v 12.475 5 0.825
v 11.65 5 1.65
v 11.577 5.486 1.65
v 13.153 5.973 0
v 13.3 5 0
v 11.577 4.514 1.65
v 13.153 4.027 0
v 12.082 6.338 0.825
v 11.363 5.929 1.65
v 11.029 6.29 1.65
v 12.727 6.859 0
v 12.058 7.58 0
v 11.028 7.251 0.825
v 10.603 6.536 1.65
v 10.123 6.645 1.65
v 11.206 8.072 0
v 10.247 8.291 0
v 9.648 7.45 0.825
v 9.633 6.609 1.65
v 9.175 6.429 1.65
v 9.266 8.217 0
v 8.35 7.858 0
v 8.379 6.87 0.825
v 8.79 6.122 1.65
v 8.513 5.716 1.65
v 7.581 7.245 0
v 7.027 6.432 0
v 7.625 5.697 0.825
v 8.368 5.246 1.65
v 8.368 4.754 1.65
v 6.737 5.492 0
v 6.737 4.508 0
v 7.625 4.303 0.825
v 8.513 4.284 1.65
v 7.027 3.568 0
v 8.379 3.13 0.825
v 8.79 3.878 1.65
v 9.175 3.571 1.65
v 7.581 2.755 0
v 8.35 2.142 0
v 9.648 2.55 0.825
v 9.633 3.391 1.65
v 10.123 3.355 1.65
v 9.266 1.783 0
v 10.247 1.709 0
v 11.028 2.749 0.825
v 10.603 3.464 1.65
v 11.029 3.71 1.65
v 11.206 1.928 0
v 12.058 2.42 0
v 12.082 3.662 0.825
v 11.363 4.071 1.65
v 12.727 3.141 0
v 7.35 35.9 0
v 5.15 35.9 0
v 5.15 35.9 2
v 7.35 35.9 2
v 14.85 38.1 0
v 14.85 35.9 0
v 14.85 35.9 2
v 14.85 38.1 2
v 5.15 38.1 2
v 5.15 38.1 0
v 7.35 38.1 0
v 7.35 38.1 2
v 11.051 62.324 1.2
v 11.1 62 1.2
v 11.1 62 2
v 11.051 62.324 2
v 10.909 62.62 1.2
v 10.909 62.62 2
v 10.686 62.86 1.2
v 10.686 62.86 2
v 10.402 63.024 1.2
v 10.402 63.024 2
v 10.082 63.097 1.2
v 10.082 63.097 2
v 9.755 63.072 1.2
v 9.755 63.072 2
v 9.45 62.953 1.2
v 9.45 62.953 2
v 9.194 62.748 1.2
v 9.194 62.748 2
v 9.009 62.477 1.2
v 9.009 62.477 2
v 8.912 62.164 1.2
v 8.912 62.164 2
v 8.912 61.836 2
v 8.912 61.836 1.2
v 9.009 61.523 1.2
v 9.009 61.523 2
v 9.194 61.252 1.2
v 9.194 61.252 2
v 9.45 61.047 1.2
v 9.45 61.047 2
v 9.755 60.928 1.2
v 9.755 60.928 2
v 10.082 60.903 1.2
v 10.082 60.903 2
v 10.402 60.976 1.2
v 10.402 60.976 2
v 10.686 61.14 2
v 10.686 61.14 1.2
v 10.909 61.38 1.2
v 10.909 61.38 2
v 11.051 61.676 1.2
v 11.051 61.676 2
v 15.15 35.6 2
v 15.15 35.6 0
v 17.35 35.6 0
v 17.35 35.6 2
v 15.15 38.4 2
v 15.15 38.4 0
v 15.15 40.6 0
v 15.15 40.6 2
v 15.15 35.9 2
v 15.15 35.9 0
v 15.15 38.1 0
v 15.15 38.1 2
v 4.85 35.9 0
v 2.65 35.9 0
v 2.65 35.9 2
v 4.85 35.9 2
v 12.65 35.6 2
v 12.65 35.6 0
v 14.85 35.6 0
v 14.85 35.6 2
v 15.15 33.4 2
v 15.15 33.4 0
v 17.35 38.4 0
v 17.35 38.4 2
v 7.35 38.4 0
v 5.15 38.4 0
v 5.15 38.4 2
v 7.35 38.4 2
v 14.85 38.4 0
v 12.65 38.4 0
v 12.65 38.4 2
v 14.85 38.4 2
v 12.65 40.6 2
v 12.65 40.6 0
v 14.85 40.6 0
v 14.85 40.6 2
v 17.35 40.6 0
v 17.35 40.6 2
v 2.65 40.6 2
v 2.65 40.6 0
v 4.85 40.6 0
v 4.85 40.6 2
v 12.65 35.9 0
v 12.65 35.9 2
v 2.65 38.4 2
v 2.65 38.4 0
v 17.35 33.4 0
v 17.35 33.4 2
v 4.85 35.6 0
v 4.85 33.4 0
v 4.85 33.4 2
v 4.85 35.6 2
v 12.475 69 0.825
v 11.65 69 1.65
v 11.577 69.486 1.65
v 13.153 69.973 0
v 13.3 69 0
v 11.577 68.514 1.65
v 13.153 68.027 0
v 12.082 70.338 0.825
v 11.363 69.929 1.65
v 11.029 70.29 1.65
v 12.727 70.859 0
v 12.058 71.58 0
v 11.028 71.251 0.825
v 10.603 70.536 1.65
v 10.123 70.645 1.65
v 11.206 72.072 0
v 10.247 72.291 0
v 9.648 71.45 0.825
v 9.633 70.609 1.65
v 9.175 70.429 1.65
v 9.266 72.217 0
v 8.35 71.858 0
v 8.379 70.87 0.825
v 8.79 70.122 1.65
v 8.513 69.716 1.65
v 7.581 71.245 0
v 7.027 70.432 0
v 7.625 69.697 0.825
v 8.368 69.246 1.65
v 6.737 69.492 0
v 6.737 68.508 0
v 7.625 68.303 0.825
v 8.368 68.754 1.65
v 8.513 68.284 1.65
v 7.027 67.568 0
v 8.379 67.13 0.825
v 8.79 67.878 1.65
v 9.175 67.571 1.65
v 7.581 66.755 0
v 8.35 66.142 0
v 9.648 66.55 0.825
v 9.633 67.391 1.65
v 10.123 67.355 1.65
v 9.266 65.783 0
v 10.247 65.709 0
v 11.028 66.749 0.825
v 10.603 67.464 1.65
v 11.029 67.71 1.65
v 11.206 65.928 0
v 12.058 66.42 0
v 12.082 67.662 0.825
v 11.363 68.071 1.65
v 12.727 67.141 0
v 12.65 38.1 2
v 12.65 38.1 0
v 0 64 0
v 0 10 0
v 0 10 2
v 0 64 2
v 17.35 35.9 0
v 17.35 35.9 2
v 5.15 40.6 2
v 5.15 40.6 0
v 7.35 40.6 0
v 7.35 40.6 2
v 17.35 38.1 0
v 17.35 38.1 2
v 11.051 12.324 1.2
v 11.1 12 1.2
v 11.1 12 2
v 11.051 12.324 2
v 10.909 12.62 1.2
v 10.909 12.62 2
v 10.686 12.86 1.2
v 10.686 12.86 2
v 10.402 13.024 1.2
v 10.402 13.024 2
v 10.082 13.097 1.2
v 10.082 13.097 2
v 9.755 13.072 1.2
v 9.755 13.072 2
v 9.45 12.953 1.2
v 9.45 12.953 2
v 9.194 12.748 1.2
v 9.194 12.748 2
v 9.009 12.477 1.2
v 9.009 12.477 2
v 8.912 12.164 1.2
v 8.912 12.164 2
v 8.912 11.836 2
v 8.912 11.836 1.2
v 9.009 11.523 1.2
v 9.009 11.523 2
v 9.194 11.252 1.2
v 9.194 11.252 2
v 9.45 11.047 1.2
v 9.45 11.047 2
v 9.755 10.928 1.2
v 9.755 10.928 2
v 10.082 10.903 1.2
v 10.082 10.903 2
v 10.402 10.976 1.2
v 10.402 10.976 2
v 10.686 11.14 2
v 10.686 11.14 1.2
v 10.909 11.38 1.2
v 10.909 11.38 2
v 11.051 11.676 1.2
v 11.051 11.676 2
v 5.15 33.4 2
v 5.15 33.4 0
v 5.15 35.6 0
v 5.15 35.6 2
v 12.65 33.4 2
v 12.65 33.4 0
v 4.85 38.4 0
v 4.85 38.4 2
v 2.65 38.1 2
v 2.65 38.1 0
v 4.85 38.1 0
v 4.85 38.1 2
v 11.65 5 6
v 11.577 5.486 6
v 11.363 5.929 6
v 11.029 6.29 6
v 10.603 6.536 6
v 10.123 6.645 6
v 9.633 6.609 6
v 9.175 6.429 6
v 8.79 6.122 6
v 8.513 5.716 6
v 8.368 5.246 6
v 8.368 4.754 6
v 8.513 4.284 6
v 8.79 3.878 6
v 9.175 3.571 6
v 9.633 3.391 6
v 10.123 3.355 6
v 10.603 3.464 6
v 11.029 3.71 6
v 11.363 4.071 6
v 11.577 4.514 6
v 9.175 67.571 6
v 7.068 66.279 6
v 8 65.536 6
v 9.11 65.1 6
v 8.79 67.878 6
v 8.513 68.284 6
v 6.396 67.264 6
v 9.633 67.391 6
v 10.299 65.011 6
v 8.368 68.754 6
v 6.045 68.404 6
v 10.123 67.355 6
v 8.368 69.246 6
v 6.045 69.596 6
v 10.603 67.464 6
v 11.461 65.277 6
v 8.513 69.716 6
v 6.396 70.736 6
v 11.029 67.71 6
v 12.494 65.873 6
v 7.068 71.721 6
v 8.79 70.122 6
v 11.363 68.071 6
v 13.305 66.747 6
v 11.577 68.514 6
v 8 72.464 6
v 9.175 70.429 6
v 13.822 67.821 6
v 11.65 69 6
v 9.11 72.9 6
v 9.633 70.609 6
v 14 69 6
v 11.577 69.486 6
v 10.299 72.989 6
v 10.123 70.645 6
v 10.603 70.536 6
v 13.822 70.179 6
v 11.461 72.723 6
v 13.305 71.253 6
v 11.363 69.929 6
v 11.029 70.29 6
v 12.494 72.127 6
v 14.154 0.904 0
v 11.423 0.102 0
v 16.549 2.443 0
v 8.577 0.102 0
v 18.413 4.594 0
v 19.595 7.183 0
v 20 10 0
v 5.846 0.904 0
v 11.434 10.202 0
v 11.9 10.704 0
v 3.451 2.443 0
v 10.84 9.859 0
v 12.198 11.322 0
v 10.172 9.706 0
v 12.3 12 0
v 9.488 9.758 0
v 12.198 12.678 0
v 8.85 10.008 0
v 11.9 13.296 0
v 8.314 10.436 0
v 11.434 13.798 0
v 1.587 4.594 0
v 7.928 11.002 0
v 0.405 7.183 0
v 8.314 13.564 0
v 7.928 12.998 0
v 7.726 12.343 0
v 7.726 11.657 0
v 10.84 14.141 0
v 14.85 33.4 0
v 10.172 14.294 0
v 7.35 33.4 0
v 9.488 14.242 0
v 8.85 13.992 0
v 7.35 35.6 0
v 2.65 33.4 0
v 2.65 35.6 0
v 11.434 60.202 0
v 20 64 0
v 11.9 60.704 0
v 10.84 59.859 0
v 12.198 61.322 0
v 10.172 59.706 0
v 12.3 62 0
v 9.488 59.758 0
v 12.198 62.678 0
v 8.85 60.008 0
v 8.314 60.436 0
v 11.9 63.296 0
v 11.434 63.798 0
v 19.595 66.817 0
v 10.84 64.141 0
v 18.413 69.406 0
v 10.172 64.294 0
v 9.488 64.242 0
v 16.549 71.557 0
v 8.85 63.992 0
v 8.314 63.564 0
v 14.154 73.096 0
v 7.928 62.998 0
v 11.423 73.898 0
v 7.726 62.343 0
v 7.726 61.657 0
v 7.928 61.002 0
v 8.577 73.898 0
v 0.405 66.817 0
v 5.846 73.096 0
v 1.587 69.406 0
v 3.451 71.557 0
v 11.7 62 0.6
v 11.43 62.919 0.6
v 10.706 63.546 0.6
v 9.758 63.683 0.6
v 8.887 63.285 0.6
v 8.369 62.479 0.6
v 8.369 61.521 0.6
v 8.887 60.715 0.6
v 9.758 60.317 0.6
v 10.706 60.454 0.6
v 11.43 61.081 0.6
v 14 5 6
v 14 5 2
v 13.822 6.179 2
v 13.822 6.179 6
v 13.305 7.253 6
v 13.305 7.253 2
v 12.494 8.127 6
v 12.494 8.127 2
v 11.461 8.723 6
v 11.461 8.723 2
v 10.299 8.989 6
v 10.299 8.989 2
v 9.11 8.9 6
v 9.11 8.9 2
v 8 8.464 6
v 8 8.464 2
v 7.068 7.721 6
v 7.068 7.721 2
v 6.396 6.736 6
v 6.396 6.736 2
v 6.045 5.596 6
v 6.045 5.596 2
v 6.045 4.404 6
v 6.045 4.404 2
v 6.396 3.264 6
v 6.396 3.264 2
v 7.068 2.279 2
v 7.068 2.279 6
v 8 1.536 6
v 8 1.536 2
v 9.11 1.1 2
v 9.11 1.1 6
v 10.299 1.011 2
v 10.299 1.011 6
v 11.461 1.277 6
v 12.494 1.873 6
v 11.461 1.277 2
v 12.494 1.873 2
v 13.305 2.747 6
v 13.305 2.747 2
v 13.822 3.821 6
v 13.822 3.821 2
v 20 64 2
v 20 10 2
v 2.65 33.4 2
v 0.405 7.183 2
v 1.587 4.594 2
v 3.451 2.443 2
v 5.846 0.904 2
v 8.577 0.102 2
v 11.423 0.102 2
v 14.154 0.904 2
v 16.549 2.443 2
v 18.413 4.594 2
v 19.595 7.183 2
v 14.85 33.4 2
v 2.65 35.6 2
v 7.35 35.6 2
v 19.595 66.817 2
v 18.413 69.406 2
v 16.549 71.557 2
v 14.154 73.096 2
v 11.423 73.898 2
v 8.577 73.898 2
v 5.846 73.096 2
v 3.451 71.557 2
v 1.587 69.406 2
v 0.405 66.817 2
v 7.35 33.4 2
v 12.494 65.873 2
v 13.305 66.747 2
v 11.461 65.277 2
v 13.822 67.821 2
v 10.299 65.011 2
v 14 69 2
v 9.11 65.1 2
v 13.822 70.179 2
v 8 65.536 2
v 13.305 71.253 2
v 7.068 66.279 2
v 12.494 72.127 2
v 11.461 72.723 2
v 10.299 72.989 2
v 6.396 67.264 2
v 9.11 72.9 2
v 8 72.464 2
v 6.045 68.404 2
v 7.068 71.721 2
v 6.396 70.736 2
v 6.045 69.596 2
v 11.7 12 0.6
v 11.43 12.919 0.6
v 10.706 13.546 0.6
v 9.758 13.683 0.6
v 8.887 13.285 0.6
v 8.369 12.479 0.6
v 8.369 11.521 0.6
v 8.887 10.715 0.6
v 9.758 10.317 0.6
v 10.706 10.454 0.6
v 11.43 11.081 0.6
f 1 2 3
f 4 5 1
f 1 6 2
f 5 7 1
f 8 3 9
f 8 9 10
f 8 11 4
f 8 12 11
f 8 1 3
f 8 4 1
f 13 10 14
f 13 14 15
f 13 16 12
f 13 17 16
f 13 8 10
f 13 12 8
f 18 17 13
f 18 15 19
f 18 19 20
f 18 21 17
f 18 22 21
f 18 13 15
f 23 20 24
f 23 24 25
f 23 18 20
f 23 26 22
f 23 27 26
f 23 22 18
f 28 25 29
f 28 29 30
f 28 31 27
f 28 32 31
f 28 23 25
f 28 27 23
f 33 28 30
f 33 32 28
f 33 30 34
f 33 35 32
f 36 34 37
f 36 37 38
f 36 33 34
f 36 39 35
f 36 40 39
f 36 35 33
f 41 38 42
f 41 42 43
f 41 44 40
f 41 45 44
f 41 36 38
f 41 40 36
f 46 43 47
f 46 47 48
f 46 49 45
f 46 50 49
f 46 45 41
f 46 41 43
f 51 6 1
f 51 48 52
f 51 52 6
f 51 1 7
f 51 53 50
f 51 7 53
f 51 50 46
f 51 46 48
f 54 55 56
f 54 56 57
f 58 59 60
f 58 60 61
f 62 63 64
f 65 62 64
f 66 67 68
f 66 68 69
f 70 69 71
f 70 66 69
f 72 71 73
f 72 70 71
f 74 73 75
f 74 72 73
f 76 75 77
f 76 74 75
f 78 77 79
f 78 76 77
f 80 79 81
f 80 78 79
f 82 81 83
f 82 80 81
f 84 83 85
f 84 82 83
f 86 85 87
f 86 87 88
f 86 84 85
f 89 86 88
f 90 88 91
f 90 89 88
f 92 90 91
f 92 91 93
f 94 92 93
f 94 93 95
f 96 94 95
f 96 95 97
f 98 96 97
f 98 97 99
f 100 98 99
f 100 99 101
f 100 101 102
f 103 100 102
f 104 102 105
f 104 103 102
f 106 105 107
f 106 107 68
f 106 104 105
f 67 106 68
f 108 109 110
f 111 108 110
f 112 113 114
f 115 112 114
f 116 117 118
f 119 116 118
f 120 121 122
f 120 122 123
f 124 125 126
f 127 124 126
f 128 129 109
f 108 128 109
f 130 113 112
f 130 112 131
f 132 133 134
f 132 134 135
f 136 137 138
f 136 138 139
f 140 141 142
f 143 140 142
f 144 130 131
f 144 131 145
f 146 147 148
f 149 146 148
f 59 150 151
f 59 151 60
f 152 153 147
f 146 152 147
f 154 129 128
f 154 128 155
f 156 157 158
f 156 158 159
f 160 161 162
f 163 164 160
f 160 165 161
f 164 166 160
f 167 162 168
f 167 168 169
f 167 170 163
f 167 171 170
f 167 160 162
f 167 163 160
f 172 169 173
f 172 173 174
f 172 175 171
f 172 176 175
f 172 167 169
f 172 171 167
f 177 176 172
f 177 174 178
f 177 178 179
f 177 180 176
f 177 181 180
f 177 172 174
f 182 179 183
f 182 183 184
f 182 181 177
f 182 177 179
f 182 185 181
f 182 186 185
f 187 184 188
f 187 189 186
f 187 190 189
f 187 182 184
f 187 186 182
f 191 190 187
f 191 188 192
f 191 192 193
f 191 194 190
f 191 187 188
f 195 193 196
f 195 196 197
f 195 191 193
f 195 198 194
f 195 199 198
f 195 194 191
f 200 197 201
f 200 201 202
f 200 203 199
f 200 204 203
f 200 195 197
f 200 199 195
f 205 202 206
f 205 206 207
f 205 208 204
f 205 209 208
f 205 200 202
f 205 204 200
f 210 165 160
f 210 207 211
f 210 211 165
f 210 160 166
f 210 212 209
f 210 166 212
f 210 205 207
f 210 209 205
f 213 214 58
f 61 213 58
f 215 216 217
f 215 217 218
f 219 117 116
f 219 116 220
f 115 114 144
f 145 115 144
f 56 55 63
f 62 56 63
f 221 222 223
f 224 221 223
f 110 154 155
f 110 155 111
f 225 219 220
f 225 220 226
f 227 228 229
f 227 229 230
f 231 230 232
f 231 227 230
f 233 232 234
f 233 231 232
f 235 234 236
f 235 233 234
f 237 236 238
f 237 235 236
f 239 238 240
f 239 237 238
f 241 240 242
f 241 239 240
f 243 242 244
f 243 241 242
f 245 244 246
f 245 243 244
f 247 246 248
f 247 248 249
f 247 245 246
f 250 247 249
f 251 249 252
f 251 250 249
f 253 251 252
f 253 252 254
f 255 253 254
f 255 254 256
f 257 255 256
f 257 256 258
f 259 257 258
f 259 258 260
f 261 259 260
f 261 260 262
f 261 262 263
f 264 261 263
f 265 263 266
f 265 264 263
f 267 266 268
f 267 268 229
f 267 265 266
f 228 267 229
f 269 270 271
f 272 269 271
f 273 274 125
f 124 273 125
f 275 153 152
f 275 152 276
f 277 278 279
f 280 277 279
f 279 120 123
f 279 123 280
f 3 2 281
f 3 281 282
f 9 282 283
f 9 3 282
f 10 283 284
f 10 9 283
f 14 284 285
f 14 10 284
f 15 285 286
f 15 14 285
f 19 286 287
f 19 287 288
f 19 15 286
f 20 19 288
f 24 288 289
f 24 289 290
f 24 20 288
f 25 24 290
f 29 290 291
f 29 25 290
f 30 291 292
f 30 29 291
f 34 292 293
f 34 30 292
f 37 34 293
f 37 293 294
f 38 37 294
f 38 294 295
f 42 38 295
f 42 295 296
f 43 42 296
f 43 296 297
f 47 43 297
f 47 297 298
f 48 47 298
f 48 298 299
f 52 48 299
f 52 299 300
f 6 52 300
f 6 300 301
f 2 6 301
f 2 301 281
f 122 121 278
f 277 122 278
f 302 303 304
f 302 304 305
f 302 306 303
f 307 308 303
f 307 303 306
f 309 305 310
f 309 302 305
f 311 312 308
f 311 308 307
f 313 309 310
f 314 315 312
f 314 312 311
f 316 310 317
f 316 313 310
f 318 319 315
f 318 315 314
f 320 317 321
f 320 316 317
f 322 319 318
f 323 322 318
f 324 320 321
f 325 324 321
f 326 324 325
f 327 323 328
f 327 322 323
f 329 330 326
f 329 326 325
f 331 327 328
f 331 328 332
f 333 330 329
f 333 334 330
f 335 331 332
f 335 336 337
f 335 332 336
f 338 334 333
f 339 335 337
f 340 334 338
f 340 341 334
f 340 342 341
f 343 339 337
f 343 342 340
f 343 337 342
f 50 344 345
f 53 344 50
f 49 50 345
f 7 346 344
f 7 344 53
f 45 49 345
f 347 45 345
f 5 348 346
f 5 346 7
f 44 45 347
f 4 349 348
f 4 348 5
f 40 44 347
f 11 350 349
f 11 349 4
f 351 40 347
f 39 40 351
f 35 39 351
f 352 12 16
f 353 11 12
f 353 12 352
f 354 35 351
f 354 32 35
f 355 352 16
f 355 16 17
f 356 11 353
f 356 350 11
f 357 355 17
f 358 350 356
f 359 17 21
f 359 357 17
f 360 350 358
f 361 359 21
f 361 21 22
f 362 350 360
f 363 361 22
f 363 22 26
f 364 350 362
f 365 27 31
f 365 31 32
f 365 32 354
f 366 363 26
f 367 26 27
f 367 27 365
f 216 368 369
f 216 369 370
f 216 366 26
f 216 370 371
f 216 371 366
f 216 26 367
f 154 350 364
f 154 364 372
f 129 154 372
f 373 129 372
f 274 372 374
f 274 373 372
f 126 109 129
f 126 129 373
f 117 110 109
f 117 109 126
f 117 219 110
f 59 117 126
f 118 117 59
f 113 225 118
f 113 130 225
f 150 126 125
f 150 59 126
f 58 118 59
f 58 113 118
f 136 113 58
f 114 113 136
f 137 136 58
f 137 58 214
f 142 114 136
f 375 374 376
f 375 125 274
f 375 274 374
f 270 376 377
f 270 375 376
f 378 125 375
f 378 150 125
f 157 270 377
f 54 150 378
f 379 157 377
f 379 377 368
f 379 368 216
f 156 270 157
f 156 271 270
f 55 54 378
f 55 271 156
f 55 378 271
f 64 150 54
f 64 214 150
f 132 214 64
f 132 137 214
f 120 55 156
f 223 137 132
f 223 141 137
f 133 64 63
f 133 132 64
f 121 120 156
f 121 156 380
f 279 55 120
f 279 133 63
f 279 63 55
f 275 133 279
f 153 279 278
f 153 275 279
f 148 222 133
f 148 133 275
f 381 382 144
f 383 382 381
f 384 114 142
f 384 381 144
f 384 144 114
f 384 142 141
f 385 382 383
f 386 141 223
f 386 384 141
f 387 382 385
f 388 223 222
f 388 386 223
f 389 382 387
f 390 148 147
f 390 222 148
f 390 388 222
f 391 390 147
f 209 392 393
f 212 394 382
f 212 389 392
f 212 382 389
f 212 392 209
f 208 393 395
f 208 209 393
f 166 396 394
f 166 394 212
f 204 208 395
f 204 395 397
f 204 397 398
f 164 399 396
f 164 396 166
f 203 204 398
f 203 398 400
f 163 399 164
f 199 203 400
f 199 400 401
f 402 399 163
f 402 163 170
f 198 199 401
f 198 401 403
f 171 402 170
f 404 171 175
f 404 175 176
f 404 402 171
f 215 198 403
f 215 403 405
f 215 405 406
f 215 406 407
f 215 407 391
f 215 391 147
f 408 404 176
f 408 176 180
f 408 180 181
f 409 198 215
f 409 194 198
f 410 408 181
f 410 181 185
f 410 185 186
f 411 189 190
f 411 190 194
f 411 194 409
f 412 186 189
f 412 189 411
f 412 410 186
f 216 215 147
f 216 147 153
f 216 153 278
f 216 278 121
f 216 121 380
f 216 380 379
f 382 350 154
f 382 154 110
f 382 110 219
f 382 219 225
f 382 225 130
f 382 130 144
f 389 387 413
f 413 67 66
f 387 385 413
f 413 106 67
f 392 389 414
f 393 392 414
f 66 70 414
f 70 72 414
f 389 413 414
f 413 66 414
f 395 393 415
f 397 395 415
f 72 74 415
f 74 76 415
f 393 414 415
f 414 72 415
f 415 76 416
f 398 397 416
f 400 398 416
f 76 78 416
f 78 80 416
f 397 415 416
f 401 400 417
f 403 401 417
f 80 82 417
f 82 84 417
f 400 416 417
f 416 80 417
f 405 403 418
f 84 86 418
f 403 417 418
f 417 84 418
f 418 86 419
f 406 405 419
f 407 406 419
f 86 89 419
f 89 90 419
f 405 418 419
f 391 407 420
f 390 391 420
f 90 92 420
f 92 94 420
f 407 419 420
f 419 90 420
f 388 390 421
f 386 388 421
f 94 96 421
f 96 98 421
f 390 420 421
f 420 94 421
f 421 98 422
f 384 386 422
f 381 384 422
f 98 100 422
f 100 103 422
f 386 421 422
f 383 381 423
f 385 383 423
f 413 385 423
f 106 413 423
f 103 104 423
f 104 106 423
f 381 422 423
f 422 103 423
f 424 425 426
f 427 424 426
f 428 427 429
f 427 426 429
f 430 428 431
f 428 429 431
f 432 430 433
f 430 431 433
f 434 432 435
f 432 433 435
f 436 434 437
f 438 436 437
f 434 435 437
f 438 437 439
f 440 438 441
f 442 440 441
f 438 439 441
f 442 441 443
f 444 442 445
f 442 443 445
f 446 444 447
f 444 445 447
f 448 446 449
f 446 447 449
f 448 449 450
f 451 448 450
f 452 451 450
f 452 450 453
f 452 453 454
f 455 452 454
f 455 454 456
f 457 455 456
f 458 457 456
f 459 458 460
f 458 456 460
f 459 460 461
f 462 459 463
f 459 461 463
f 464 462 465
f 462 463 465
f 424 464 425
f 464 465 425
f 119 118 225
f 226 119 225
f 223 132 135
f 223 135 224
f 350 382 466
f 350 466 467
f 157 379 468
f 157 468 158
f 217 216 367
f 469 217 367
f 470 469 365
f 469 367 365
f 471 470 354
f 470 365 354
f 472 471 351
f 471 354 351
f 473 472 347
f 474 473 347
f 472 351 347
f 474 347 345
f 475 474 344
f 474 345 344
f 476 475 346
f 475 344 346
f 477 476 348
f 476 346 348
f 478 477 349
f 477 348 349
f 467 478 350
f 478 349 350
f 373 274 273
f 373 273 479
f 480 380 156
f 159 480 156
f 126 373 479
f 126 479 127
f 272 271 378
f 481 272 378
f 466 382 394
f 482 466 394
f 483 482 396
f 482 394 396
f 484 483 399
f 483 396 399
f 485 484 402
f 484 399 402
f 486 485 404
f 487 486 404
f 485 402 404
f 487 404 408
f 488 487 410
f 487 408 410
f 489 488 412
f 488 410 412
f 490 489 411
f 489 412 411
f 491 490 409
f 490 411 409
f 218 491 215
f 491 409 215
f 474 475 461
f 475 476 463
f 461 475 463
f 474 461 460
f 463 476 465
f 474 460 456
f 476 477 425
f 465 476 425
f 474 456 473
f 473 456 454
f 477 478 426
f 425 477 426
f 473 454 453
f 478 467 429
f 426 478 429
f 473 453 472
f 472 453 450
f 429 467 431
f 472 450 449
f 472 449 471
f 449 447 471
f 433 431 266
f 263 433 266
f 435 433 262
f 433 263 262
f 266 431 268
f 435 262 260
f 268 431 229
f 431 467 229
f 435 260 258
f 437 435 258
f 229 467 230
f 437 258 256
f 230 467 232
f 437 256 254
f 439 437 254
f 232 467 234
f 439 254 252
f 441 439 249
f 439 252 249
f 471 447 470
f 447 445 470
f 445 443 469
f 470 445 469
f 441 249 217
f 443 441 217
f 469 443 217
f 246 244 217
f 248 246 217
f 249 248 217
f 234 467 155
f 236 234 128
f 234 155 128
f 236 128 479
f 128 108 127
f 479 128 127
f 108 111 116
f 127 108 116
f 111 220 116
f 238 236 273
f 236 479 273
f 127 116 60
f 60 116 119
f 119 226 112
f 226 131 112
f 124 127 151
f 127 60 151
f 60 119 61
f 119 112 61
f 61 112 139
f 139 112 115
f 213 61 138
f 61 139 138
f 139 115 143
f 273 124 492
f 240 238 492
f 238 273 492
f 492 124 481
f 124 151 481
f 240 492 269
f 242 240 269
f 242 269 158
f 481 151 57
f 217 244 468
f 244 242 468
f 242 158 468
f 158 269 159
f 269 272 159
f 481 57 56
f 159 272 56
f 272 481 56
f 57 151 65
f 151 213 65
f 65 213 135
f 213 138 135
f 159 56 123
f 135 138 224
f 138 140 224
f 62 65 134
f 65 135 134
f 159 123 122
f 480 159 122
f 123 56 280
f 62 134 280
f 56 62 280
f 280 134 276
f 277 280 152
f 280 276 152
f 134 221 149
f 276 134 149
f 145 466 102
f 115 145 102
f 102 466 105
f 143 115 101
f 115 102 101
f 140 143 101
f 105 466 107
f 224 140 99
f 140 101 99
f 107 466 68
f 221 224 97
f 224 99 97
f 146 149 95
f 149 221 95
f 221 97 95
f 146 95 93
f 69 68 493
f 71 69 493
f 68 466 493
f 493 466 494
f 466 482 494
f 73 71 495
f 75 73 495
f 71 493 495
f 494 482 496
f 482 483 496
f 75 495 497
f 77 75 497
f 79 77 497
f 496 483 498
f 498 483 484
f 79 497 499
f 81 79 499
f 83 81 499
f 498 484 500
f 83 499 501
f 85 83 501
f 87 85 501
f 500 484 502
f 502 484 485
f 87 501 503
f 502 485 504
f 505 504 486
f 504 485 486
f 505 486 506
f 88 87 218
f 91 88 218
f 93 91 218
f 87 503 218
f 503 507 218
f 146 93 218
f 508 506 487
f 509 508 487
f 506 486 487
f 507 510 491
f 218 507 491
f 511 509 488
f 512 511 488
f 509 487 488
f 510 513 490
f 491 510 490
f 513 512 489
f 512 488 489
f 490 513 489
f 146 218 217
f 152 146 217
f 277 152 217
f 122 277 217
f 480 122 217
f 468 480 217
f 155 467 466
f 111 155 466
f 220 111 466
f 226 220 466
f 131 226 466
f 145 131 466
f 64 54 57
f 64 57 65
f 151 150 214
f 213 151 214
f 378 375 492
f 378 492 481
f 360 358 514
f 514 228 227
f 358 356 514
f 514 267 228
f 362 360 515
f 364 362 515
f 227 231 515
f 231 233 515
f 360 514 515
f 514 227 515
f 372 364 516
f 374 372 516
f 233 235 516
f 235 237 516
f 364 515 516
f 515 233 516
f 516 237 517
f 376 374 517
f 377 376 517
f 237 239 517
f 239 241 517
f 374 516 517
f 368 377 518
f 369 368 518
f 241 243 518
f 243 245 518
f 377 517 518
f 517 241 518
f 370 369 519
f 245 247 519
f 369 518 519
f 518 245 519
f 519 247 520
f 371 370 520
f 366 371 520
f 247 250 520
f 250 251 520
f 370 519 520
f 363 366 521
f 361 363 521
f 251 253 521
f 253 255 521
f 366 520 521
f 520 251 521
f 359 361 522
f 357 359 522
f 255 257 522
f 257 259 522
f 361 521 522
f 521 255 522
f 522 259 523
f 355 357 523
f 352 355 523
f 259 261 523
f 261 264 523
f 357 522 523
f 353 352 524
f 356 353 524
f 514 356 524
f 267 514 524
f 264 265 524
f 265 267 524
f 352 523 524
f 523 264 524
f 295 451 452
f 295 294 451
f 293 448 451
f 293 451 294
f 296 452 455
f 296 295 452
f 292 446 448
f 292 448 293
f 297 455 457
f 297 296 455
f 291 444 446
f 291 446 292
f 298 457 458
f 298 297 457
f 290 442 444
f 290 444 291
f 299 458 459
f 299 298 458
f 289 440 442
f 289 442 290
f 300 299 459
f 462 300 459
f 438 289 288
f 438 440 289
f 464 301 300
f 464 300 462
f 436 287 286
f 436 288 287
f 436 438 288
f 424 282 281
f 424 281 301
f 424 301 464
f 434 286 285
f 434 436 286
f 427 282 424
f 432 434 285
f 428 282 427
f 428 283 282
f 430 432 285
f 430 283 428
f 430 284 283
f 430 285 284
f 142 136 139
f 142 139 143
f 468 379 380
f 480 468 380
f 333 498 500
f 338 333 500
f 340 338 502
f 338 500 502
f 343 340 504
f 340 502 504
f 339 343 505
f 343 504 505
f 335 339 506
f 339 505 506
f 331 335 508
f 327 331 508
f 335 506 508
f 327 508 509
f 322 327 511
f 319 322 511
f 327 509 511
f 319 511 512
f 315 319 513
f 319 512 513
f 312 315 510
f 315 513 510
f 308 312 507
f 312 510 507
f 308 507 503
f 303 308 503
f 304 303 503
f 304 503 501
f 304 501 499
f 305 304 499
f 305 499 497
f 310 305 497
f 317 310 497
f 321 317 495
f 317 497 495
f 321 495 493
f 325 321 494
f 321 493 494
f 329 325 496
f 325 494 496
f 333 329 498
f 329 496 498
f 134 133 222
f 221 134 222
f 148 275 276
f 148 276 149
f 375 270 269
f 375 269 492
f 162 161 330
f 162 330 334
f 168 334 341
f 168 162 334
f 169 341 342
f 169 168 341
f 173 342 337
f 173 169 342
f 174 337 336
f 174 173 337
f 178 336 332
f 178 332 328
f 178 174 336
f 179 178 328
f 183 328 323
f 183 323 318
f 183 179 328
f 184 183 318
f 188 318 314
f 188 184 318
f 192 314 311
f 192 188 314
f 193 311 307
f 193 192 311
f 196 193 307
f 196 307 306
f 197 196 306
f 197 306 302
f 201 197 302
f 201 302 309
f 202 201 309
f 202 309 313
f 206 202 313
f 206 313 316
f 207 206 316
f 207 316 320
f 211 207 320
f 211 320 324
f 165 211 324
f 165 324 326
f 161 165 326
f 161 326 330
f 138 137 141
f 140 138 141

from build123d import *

# Parameters (mm, degrees)
SKETCH_R        = 1.65
SKETCH_R_2      = 1.1
SKETCH_W        = 2.2
SKETCH_H        = 2.2
PAD_DEPTH       = 2
CHAMFER_SIZE    = 1.65
SKETCH001_R     = 4
SKETCH001_R_2   = 1.65
PAD001_DEPTH    = 4
CHAMFER001_SIZE = 1.2


with BuildPart() as chamfer_body:
    # Sketch → Pad (new body)
    with BuildSketch(Plane.XY):
        with BuildLine():
            Line((0, 10), (0, 64))
            ThreePointArc((20, 64), (10, 74), (0, 64))
            Line((20, 64), (20, 10))
            ThreePointArc((0, 10), (10, 0), (20, 10))
        make_face()
        with Locations((10, 69)):
            Circle(SKETCH_R, mode=Mode.SUBTRACT)
        with Locations((10, 5)):
            Circle(SKETCH_R, mode=Mode.SUBTRACT)
        with Locations((10, 62)):
            Circle(SKETCH_R_2, mode=Mode.SUBTRACT)
        with Locations((10, 12)):
            Circle(SKETCH_R_2, mode=Mode.SUBTRACT)
        with Locations((3.75, 39.5)):
            Rectangle(SKETCH_W, SKETCH_H, mode=Mode.SUBTRACT)
        with Locations((3.75, 37)):
            Rectangle(SKETCH_W, SKETCH_H, mode=Mode.SUBTRACT)
        with Locations((3.75, 34.5)):
            Rectangle(SKETCH_W, SKETCH_H, mode=Mode.SUBTRACT)
        with Locations((6.25, 34.5)):
            Rectangle(SKETCH_W, SKETCH_H, mode=Mode.SUBTRACT)
        with Locations((6.25, 37)):
            Rectangle(SKETCH_W, SKETCH_H, mode=Mode.SUBTRACT)
        with Locations((6.25, 39.5)):
            Rectangle(SKETCH_W, SKETCH_H, mode=Mode.SUBTRACT)
        with Locations((13.75, 39.5)):
            Rectangle(SKETCH_W, SKETCH_H, mode=Mode.SUBTRACT)
        with Locations((13.75, 37)):
            Rectangle(SKETCH_W, SKETCH_H, mode=Mode.SUBTRACT)
        with Locations((13.75, 34.5)):
            Rectangle(SKETCH_W, SKETCH_H, mode=Mode.SUBTRACT)
        with Locations((16.25, 34.5)):
            Rectangle(SKETCH_W, SKETCH_H, mode=Mode.SUBTRACT)
        with Locations((16.25, 37)):
            Rectangle(SKETCH_W, SKETCH_H, mode=Mode.SUBTRACT)
        with Locations((16.25, 39.5)):
            Rectangle(SKETCH_W, SKETCH_H, mode=Mode.SUBTRACT)
    extrude(amount=PAD_DEPTH)

    # Chamfer
    chamfer_edges = [chamfer_body.edges().sort_by_distance(p)[0] for p in [
        (8.35, 69, 0),
        (8.35, 5, 0),
    ]]
    chamfer(chamfer_edges, length=CHAMFER_SIZE)


with BuildPart() as chamfer001:
    # Sketch001 → Pad001 (new body)
    with BuildSketch(Plane.XY.offset(2)):
        with Locations((10, 69)):
            Circle(SKETCH001_R)
        with Locations((10, 69)):
            Circle(SKETCH001_R_2, mode=Mode.SUBTRACT)
        with Locations((10, 5)):
            Circle(SKETCH001_R)
        with Locations((10, 5)):
            Circle(SKETCH001_R_2, mode=Mode.SUBTRACT)
    extrude(amount=PAD001_DEPTH)

    # Fusion: union Chamfer body
    add(chamfer_body.part)

    # Chamfer001
    chamfer001_edges = [chamfer001.edges().sort_by_distance(p)[0] for p in [
        (8.9, 62, 0),
        (8.9, 12, 0),
    ]]
    chamfer(chamfer001_edges, length=CHAMFER001_SIZE)


solid = chamfer001.part
